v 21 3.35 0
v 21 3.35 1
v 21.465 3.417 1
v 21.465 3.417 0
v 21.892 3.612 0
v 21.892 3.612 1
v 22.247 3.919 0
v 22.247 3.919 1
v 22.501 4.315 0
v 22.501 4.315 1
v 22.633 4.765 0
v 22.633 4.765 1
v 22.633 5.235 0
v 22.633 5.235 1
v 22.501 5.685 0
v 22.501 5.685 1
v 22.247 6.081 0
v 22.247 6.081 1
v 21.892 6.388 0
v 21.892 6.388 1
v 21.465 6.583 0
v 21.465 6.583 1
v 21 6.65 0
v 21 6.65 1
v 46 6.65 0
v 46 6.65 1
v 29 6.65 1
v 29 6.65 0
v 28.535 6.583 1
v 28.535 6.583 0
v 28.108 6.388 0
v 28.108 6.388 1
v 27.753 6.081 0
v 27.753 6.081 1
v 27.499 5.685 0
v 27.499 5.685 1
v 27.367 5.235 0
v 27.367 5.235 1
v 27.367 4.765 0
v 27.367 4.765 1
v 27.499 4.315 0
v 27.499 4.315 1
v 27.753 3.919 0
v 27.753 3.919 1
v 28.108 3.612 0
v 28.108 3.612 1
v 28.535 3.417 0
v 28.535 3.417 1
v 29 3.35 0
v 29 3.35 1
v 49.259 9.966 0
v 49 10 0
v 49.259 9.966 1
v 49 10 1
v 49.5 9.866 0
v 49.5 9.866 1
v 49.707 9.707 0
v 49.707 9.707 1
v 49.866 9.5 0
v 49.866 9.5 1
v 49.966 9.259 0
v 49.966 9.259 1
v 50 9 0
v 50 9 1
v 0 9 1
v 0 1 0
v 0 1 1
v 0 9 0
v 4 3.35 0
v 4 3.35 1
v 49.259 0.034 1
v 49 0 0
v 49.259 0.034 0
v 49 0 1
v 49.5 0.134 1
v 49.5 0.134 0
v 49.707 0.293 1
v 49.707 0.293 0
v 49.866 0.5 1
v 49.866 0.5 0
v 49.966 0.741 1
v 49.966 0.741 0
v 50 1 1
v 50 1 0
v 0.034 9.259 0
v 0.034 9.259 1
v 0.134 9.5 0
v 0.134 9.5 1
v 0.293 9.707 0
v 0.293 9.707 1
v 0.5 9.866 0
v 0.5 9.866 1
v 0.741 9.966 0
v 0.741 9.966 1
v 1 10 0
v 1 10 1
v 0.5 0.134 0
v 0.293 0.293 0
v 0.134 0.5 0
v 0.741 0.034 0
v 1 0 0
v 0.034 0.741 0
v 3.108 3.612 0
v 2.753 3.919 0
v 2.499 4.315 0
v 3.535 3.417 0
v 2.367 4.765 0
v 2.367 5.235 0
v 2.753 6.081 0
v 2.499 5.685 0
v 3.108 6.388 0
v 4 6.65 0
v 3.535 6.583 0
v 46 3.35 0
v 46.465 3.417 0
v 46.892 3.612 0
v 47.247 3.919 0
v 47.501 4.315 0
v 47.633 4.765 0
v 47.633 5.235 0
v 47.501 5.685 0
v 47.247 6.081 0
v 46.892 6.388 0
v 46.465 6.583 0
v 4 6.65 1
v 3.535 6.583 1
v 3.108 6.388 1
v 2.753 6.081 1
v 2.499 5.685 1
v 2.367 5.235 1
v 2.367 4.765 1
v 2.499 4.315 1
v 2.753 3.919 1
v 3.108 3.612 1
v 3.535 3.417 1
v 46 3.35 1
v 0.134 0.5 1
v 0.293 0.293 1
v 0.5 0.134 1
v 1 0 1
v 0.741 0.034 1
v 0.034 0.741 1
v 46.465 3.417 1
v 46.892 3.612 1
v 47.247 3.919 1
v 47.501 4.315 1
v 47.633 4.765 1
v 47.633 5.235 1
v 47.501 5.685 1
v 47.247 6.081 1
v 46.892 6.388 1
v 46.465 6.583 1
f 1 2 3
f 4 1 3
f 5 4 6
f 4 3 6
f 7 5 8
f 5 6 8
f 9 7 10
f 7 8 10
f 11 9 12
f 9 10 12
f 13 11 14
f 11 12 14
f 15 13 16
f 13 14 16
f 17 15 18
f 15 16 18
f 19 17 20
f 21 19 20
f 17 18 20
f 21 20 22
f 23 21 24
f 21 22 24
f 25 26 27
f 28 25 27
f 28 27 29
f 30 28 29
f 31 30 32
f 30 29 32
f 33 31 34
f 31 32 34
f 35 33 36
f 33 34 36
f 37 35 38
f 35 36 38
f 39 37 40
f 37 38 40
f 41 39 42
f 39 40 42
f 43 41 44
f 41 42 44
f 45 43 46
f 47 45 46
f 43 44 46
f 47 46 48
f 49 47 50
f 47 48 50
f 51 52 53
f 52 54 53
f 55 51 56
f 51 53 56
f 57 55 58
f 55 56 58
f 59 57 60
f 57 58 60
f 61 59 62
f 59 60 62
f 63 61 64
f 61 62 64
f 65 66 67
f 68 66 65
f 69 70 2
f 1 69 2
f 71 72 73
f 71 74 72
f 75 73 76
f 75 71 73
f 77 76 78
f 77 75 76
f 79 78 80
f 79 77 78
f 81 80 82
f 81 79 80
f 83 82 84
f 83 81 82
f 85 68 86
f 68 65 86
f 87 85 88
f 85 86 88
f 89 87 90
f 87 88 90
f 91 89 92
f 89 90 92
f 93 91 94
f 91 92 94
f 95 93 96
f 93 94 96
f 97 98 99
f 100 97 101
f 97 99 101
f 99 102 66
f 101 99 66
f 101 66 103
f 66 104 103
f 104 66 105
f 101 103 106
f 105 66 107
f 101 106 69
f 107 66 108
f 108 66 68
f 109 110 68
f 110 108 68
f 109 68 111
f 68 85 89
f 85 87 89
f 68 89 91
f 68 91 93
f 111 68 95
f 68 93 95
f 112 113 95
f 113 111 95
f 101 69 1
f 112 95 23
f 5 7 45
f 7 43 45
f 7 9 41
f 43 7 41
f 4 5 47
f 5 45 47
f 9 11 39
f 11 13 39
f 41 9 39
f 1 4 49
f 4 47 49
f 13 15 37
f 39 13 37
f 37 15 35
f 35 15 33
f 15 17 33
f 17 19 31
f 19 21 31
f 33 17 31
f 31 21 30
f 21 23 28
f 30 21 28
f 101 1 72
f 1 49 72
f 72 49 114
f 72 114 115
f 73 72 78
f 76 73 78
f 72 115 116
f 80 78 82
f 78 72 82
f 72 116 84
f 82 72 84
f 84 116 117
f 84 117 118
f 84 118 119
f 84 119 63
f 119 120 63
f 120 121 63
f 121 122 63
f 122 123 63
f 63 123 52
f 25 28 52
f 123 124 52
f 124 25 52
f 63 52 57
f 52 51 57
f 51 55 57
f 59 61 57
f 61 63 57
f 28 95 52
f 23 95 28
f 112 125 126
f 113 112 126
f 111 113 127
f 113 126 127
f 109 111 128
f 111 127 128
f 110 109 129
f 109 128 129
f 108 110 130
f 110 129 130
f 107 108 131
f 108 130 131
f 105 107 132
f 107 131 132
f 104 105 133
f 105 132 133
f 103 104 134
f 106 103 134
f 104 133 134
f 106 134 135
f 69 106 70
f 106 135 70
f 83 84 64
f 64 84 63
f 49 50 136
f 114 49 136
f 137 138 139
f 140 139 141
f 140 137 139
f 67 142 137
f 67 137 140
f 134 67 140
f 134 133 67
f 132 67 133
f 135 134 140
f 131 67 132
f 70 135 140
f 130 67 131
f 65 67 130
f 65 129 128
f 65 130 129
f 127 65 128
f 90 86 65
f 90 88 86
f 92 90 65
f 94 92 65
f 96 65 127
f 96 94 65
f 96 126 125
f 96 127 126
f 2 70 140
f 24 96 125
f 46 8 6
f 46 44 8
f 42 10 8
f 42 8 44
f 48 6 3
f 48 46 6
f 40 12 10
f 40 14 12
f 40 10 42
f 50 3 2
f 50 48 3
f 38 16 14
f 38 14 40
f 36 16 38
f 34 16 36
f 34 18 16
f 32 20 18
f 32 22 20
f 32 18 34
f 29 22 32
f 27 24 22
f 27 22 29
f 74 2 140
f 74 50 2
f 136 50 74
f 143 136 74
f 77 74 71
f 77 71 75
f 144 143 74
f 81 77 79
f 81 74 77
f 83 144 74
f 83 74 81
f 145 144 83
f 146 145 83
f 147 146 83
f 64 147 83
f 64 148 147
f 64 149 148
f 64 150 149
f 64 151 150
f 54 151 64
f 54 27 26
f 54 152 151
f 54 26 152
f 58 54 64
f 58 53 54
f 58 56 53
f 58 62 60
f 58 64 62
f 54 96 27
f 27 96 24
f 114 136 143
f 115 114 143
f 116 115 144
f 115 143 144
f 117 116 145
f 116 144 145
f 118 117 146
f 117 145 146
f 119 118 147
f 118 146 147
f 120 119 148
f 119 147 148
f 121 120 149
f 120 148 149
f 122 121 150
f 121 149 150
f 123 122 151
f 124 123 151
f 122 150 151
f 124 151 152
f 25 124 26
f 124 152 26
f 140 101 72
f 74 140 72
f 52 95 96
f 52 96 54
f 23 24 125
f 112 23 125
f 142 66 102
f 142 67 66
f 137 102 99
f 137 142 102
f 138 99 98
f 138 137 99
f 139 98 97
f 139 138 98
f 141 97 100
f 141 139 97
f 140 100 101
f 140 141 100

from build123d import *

# Parameters (mm, degrees)
F0_W     = 50
F0_H     = 10
F1_DEPTH = 1
F3_DEPTH = 25
F4_R     = 1


with BuildPart() as f1:
    # F0 (on Top) → F1 (new body)
    with BuildSketch(Plane.XY):
        with Locations((25, 5)):
            Rectangle(F0_W, F0_H)
    extrude(amount=F1_DEPTH)

    # F2 (on face) → F3 (cut)
    with BuildSketch(Plane.XY.offset(1)):
        with BuildLine():
            Line((21, 6.65), (4, 6.65))
            ThreePointArc((4, 6.65), (2.35, 5), (4, 3.35))
            Line((4, 3.35), (21, 3.35))
            ThreePointArc((21, 3.35), (22.65, 5), (21, 6.65))
        make_face()
        with BuildLine():
            ThreePointArc((29, 6.65), (27.35, 5), (29, 3.35))
            Line((29, 3.35), (46, 3.35))
            ThreePointArc((46, 3.35), (47.65, 5), (46, 6.65))
            Line((46, 6.65), (29, 6.65))
        make_face()
    extrude(amount=-F3_DEPTH, mode=Mode.SUBTRACT)

    # F4
    f4_edges = [f1.edges().sort_by_distance(p)[0] for p in [
        (50, 0, 0.5),
        (50, 10, 0.5),
        (0, 10, 0.5),
        (0, 0, 0.5),
    ]]
    fillet(f4_edges, radius=F4_R)


solid = f1.part
